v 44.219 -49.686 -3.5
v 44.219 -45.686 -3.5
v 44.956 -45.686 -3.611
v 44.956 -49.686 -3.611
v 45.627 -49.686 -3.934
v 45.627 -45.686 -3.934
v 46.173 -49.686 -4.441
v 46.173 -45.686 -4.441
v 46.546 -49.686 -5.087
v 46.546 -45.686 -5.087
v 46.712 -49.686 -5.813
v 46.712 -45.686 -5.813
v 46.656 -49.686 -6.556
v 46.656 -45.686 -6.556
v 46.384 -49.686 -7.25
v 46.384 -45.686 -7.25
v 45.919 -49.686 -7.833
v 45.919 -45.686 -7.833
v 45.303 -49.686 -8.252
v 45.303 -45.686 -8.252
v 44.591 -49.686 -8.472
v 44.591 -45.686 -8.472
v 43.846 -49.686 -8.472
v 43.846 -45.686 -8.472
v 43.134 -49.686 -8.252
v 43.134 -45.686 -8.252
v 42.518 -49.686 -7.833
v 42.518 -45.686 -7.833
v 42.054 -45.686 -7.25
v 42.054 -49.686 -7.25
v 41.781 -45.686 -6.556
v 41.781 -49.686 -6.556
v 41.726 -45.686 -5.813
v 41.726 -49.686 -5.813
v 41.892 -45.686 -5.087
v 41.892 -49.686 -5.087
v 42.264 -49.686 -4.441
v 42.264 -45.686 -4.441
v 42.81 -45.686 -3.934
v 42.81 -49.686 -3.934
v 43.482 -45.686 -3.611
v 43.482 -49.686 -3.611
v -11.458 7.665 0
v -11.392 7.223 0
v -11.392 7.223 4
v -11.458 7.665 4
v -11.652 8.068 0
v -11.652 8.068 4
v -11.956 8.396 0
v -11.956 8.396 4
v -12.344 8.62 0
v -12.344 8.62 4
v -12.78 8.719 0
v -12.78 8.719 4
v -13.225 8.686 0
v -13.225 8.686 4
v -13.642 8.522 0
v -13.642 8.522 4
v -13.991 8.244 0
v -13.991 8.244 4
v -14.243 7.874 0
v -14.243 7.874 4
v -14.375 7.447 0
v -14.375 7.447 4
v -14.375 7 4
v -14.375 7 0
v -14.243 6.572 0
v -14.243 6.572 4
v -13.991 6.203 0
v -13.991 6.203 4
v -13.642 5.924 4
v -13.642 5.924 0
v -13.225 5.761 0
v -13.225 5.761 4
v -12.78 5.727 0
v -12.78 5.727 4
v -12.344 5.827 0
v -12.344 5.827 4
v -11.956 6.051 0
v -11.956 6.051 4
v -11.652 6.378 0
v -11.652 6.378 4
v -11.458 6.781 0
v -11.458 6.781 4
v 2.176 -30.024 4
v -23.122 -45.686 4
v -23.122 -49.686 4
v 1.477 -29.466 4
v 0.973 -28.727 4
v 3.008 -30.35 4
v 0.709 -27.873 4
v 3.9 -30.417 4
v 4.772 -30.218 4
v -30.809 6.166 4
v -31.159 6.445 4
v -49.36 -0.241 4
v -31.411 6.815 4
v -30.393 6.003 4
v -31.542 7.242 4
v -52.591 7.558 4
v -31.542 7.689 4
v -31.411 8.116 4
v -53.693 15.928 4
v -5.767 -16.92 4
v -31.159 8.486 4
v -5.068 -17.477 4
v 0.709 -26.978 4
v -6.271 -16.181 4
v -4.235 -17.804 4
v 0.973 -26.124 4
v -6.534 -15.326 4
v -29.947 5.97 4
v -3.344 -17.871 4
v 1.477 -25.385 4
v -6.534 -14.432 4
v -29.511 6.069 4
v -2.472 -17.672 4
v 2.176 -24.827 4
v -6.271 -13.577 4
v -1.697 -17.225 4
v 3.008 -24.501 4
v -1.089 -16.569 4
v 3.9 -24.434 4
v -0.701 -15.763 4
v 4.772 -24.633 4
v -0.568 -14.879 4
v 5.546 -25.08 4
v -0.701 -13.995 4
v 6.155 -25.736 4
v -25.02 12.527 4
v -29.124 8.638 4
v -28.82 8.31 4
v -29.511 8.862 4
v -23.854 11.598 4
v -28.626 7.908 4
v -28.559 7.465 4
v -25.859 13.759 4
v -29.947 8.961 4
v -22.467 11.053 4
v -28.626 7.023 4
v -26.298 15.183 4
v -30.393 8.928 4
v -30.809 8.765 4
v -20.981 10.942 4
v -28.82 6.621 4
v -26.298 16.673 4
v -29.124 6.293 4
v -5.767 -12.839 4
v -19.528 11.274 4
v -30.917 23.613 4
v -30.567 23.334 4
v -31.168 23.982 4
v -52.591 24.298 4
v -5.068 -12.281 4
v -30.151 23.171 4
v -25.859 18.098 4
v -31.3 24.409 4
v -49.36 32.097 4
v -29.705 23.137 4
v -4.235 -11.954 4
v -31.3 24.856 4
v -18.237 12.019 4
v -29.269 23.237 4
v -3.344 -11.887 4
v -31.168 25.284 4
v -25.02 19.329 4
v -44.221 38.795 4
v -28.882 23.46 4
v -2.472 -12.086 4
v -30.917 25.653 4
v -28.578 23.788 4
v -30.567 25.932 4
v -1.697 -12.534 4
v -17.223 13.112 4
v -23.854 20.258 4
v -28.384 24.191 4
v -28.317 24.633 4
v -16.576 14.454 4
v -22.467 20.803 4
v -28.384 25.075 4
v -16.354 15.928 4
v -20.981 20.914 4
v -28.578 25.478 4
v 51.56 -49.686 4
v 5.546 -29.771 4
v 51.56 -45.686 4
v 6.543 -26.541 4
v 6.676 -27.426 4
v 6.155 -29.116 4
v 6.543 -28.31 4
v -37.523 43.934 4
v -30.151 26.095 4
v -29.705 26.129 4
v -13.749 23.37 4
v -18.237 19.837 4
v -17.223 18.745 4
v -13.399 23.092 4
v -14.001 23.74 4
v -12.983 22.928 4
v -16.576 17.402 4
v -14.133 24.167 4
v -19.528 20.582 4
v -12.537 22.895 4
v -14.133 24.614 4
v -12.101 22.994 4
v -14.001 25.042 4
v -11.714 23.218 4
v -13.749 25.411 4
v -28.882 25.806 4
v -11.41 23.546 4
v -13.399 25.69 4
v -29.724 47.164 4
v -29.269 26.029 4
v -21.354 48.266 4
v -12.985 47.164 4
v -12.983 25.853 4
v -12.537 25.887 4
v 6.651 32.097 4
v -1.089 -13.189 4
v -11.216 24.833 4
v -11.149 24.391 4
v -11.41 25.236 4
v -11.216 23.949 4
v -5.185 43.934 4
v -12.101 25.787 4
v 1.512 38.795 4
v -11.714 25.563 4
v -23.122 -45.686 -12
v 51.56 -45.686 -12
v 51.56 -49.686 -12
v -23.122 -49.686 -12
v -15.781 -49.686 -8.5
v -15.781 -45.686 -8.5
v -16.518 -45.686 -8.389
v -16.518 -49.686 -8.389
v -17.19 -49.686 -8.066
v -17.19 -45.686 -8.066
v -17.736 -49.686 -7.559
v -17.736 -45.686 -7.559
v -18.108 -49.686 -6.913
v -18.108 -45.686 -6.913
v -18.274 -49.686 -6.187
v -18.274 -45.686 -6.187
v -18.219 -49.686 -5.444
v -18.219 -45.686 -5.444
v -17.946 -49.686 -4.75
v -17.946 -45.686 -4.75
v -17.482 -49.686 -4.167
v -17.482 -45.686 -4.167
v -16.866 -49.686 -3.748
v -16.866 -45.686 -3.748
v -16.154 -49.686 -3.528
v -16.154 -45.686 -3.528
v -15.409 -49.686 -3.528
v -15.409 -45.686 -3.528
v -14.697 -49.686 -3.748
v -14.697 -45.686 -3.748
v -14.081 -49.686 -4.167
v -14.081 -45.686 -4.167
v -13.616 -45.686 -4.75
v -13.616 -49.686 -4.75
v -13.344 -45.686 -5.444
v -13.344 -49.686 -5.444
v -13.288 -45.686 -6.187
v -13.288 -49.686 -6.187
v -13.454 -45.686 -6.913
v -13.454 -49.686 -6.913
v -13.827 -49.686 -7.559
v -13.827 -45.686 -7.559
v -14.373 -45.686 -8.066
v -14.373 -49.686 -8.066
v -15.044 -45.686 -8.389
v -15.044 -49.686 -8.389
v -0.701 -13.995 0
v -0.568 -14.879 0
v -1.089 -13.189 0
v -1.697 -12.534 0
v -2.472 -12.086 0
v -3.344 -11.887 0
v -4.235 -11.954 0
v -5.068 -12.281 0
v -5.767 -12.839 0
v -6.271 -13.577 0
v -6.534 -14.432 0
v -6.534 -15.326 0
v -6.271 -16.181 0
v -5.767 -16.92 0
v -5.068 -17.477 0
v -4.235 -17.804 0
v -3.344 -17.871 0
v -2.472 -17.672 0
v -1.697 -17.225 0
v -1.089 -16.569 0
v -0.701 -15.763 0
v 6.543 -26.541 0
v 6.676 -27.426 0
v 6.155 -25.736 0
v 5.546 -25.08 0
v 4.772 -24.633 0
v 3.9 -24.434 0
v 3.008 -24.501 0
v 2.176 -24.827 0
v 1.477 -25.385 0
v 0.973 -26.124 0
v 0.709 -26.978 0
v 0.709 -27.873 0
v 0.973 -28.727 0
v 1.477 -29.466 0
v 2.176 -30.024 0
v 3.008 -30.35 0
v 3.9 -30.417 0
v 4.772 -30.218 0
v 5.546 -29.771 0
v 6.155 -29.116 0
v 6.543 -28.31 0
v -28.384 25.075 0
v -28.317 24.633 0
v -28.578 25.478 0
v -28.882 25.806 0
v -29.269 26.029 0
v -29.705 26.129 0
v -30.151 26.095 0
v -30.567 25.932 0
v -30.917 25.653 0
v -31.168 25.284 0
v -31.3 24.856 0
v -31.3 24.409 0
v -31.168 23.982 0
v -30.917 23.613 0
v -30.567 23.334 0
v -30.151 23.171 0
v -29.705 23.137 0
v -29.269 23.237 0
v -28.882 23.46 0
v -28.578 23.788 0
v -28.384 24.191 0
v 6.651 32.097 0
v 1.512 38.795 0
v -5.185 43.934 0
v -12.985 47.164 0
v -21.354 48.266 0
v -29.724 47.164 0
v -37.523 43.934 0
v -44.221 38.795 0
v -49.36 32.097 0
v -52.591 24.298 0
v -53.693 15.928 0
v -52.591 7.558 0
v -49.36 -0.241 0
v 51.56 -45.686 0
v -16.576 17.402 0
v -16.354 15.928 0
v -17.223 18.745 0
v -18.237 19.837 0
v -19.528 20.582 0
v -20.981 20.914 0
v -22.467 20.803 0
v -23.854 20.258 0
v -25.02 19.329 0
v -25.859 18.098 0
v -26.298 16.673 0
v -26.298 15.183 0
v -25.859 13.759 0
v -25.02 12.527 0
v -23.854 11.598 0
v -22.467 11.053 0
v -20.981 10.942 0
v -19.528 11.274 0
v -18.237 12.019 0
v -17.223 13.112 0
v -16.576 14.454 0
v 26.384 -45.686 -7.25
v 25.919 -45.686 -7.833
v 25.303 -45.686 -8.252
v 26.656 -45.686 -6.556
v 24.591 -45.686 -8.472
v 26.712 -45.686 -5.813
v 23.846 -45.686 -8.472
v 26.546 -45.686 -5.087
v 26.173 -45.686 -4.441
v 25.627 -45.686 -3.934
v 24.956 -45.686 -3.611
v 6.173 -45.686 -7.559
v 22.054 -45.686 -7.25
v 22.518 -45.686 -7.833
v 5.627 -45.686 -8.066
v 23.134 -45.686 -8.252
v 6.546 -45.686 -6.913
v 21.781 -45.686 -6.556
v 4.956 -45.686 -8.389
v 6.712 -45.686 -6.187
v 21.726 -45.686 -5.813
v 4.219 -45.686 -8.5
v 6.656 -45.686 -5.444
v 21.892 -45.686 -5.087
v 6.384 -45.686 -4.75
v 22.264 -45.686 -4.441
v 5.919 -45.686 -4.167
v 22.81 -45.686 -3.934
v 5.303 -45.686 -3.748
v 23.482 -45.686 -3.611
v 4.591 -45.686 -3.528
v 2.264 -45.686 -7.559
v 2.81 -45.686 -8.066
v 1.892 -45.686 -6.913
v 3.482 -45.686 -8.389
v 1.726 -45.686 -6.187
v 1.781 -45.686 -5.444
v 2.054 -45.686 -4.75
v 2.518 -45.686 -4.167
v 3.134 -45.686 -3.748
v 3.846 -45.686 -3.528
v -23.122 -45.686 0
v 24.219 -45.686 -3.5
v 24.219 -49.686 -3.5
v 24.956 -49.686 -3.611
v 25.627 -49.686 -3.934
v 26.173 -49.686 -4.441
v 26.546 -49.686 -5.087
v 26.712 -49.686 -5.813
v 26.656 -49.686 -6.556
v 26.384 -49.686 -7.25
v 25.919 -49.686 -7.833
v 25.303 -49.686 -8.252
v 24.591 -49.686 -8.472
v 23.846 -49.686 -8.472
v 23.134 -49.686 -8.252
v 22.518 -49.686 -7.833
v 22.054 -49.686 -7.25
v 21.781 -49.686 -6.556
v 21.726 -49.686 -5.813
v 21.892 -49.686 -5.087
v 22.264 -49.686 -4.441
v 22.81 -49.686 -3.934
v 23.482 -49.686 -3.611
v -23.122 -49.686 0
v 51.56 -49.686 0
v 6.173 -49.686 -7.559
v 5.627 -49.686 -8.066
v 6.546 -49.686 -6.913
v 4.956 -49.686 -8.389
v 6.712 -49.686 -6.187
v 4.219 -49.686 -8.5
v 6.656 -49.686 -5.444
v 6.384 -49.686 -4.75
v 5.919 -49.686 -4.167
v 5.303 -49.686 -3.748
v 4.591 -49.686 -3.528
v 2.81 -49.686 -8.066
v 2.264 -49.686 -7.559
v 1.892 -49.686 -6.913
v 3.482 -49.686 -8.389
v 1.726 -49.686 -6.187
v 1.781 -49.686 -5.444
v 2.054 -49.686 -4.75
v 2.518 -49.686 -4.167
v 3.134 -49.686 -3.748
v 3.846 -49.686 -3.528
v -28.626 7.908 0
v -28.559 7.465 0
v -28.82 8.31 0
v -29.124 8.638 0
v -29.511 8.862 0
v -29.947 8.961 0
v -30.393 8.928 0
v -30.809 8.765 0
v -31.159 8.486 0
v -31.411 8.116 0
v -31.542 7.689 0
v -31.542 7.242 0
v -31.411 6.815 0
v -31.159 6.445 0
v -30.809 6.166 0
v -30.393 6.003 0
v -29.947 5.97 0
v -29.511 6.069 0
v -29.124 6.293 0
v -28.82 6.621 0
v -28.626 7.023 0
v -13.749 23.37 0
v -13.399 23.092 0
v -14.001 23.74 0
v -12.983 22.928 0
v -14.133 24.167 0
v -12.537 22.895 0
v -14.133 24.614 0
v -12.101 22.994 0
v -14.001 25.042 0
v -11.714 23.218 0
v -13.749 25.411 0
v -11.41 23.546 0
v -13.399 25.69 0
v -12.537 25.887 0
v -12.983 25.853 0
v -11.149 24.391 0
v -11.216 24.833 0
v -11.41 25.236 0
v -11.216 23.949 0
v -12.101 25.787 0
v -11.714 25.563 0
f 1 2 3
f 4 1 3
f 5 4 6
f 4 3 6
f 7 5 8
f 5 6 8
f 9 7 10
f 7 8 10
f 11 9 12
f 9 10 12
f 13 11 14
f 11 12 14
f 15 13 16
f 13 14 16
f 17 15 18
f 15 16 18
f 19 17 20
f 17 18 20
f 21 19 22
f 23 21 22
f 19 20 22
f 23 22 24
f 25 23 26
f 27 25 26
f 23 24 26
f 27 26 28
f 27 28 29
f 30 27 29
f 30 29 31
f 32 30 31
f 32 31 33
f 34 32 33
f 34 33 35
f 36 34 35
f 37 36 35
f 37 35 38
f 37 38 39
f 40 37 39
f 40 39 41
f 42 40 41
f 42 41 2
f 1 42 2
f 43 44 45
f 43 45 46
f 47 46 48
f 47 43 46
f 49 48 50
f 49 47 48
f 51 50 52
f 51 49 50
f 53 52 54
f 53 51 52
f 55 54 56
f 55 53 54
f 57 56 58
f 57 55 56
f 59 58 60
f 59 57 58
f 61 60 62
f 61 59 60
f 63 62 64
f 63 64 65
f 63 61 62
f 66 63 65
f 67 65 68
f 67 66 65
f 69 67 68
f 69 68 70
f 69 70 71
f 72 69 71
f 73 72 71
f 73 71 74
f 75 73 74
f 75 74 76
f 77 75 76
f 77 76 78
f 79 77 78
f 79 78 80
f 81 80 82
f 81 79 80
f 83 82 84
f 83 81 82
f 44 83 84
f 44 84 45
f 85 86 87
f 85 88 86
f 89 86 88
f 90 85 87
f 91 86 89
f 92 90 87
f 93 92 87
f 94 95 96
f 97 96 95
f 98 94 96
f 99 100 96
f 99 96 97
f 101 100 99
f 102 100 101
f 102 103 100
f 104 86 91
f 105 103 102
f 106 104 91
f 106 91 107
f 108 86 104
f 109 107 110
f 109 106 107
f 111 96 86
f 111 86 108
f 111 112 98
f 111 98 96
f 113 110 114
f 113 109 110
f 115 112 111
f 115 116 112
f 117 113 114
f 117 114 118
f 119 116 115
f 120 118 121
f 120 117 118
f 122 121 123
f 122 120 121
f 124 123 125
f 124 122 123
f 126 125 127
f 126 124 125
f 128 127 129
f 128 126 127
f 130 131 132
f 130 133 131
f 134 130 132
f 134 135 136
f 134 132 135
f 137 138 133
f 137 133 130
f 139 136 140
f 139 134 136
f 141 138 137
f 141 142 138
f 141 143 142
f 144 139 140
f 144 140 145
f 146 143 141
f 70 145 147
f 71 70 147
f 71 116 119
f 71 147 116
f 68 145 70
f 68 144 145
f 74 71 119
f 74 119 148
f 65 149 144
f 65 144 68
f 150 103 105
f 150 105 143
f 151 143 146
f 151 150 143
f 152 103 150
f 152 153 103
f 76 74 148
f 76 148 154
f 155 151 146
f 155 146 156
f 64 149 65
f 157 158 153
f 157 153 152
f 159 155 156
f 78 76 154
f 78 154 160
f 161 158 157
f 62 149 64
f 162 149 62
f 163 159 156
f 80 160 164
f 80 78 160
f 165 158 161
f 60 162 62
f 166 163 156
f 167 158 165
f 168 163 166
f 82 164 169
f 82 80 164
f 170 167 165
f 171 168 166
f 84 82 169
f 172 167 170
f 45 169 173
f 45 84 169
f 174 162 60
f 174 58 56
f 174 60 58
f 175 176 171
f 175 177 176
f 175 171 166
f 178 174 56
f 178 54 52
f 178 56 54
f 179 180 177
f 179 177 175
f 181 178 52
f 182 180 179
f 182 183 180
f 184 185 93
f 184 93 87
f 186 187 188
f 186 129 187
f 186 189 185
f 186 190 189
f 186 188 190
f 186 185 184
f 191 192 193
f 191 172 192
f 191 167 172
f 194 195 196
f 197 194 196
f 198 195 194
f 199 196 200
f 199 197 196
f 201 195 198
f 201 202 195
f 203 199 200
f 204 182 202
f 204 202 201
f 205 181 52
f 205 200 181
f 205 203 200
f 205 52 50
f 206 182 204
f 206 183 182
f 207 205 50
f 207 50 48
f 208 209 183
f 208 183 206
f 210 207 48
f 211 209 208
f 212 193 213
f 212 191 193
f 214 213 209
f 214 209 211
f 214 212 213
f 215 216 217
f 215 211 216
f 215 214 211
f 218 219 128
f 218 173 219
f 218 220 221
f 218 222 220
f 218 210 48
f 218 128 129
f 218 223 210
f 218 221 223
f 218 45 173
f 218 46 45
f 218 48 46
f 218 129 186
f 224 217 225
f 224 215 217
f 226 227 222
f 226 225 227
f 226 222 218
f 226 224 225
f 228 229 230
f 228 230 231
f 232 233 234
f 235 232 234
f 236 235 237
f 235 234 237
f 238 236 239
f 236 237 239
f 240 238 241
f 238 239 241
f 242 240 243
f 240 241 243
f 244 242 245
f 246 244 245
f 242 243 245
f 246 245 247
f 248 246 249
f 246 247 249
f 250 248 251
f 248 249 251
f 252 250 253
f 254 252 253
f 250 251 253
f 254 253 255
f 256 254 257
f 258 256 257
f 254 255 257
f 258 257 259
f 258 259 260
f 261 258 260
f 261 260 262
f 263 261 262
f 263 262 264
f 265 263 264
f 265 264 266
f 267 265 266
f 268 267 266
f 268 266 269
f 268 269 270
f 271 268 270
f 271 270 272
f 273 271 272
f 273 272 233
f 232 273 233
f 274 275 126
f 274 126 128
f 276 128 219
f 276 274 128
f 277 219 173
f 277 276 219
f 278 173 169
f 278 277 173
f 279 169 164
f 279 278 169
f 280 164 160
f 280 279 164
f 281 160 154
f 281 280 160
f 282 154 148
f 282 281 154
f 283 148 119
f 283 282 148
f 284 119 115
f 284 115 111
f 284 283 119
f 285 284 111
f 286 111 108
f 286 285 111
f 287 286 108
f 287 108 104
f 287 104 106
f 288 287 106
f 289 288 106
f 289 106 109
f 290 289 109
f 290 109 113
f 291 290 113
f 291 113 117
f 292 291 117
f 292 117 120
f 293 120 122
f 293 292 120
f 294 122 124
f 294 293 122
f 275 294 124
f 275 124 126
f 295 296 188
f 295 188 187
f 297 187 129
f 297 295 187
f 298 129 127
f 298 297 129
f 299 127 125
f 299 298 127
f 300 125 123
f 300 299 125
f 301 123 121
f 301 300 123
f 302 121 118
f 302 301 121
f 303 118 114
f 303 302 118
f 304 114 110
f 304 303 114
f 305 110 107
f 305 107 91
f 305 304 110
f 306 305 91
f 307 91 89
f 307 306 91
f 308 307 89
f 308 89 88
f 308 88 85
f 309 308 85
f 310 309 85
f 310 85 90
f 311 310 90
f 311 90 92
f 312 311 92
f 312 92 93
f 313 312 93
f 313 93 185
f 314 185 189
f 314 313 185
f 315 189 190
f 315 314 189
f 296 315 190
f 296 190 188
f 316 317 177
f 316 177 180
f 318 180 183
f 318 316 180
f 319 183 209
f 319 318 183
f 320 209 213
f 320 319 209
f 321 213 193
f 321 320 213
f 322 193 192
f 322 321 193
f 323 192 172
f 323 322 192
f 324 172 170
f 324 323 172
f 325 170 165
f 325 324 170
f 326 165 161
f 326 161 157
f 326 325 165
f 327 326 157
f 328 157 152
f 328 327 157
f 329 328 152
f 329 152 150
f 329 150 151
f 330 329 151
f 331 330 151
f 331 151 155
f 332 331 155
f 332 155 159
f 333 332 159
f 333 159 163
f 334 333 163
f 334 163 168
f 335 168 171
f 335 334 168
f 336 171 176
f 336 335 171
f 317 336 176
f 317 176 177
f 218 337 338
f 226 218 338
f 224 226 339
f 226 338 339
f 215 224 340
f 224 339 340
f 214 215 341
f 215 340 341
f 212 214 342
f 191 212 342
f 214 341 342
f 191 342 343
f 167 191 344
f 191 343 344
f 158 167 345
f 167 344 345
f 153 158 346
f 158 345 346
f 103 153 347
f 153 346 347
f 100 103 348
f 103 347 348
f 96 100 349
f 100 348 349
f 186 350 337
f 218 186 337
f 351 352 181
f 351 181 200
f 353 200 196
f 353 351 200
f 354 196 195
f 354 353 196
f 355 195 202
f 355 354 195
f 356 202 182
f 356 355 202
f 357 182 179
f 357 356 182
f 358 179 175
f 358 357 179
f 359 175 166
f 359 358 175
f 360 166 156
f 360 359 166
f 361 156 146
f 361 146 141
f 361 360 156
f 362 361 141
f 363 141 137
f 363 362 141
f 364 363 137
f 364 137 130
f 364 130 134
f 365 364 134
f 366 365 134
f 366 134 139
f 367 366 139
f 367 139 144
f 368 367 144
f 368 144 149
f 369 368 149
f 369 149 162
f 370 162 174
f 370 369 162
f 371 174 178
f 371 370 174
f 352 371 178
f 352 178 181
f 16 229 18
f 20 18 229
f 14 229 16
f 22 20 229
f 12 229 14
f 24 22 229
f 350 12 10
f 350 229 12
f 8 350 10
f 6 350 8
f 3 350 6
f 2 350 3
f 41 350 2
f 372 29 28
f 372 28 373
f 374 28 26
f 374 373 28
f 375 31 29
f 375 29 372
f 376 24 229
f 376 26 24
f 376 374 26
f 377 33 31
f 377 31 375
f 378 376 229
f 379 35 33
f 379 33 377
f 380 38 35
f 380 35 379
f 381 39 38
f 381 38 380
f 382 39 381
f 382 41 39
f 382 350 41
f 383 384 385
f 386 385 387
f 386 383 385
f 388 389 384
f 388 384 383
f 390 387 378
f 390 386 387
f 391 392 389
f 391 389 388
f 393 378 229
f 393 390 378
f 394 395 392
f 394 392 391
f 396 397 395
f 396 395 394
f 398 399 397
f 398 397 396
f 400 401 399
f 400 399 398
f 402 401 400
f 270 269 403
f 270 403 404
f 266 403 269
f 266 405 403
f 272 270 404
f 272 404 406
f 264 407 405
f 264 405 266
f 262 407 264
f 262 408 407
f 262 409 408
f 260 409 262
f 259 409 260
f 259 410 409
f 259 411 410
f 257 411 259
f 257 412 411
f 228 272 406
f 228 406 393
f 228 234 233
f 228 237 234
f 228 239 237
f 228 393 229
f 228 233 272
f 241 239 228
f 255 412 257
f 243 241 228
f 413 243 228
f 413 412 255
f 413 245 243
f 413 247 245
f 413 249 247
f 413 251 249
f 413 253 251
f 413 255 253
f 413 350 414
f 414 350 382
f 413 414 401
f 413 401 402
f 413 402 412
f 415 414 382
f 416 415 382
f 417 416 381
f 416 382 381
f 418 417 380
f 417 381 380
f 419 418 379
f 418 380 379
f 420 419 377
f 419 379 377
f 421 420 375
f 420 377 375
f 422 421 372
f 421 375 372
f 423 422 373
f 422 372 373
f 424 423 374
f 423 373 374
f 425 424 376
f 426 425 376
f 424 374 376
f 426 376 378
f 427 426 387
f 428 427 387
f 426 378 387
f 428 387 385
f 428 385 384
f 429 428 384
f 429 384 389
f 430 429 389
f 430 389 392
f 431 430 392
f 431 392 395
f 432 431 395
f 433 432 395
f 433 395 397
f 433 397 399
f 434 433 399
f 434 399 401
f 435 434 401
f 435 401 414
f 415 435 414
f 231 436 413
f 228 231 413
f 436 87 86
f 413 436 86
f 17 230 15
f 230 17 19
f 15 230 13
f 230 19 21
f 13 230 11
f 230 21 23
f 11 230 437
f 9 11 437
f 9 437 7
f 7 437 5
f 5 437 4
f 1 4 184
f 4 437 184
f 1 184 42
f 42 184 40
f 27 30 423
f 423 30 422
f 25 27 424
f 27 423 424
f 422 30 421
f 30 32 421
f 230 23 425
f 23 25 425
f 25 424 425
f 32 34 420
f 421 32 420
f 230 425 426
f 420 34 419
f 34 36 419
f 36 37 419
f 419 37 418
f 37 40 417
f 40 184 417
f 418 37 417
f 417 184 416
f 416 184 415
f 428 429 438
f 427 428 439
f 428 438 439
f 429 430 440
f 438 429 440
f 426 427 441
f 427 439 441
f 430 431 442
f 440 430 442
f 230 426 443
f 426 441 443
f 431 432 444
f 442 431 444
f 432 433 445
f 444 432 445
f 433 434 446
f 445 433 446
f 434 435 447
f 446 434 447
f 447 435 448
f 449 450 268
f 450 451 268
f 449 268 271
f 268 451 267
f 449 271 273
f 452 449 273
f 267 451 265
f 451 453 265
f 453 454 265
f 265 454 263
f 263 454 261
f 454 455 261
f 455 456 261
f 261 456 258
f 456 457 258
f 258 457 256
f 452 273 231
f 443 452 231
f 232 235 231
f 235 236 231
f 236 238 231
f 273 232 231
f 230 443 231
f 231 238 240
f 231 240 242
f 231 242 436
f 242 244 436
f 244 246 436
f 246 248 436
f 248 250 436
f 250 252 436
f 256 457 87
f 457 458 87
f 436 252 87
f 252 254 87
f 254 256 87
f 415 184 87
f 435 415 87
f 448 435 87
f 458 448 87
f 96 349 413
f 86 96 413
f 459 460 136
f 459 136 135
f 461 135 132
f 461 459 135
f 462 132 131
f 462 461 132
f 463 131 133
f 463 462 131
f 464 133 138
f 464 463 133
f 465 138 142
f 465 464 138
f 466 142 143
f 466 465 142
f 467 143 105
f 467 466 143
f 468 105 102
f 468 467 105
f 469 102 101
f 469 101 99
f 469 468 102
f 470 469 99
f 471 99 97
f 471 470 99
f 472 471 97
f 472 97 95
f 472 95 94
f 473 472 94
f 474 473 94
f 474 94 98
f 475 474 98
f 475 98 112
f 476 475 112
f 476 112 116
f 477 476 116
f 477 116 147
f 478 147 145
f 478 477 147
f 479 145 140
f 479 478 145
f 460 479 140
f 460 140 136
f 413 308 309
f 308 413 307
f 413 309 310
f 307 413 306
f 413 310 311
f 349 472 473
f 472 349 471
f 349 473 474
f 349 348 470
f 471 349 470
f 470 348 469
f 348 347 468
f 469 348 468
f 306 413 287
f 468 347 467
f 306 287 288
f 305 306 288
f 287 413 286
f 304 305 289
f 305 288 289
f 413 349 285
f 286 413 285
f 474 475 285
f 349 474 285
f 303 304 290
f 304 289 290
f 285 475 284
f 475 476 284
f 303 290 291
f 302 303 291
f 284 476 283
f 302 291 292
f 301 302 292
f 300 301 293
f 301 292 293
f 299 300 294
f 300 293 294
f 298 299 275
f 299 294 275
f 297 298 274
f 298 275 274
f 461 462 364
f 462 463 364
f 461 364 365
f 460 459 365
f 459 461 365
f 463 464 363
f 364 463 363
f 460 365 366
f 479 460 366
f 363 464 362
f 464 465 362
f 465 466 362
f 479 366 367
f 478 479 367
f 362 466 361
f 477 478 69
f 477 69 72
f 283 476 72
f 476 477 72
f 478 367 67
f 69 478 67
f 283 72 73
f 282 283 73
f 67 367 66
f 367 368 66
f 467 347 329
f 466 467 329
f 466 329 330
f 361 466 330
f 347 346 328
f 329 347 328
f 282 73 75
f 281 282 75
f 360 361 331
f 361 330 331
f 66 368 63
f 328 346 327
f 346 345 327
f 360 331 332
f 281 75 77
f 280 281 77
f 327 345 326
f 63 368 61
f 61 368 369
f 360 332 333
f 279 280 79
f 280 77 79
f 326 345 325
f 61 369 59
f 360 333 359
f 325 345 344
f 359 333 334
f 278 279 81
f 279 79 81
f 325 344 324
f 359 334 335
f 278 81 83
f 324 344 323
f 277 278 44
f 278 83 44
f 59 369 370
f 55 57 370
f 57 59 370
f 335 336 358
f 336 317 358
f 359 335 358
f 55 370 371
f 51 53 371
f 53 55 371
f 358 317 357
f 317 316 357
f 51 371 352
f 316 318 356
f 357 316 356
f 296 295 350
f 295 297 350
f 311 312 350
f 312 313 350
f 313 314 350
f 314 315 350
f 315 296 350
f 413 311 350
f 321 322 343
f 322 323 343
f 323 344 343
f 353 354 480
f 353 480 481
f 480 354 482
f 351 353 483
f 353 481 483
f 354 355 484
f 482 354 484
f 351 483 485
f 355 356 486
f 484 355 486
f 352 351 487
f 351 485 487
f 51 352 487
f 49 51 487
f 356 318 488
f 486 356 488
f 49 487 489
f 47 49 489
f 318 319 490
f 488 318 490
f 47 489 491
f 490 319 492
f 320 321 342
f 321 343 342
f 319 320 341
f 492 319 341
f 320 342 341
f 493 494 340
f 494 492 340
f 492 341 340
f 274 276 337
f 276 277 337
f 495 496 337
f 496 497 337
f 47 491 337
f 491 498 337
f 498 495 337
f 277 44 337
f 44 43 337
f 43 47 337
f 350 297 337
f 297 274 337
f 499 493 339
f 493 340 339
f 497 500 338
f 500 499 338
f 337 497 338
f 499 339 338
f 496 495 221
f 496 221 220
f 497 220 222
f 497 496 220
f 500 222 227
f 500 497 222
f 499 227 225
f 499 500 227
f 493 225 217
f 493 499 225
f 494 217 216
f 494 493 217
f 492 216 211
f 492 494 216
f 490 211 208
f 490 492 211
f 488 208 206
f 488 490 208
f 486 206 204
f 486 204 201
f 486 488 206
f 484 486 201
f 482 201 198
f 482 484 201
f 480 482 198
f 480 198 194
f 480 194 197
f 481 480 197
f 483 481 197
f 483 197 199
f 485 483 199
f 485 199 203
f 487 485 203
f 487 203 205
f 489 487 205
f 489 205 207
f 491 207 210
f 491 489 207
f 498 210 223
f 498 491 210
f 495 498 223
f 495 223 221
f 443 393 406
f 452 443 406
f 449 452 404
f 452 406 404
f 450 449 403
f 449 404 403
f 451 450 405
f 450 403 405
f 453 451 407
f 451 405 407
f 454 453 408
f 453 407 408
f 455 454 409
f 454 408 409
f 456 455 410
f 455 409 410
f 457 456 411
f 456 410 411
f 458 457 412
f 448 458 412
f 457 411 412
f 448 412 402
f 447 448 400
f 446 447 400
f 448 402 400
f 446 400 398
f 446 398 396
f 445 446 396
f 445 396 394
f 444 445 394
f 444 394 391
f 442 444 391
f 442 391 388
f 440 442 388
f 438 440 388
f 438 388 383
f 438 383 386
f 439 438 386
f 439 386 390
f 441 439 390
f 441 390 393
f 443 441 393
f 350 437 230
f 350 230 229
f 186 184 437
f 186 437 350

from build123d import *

# Parameters (mm, degrees)
SKETCH_1_R          = 5
SKETCH_1_R_2        = 1.5
SKETCH_1_R_3        = 3
EXTRUDE_1_DEPTH     = 4
SKETCH_2_W          = 74.681955409
SKETCH_2_H          = 4
EXTRUDE_2_DEPTH     = 12
SKETCH_3_R          = 2.5
CUT_EXTRUDE_1_DEPTH = 109.876048253


with BuildPart() as part:
    # 草图1 → 凸台-拉伸1 (new body)
    with BuildSketch(Plane.XY):
        with BuildLine():
            Line((-49.360062144, -0.241015089), (-23.122201524, -45.686322765))
            Line((-23.122201524, -45.686322765), (-23.122201524, -49.686322765))
            Line((-23.122201524, -49.686322765), (51.559753885, -49.686322765))
            Line((51.559753885, -49.686322765), (51.559753885, -45.686322765))
            Line((51.559753885, -45.686322765), (6.651404412, 32.097220205))
            ThreePointArc((6.651404412, 32.097220205), (-37.523446513, 43.933835837), (-49.360062144, -0.241015089))
        make_face()
        with Locations((-21.354328866, 15.928102558)):
            Circle(SKETCH_1_R, mode=Mode.SUBTRACT)
        with Locations((-29.816939203, 24.632935589)):
            Circle(SKETCH_1_R_2, mode=Mode.SUBTRACT)
        with Locations((-12.649495836, 24.390712895)):
            Circle(SKETCH_1_R_2, mode=Mode.SUBTRACT)
        with Locations((-12.89171853, 7.223269528)):
            Circle(SKETCH_1_R_2, mode=Mode.SUBTRACT)
        with Locations((-30.059161896, 7.465492222)):
            Circle(SKETCH_1_R_2, mode=Mode.SUBTRACT)
        with Locations((-3.567776343, -14.879110103)):
            Circle(SKETCH_1_R_3, mode=Mode.SUBTRACT)
        with Locations((3.675910259, -27.425543331)):
            Circle(SKETCH_1_R_3, mode=Mode.SUBTRACT)
    extrude(amount=EXTRUDE_1_DEPTH)

    # 草图2 → 凸台-拉伸2 (add)
    with BuildSketch(Plane(origin=(0, 0, 0), x_dir=(-1, 0, 0), z_dir=(0, 0, -1))):
        with Locations((-14.218776181, -47.686322765)):
            Rectangle(SKETCH_2_W, SKETCH_2_H)
    extrude(amount=EXTRUDE_2_DEPTH)

    # 草图3 → 切除-拉伸1 (cut, through all)
    with BuildSketch(Plane(origin=(0, -45.686322765, 0), x_dir=(1, 0, 0), z_dir=(0, 1, 0))):
        with Locations(Location((24.21877618, 6, 0), (0, 0, 270))):
            Circle(SKETCH_3_R)
        with Locations(Location((44.21877618, 6, 0), (0, 0, 270))):
            Circle(SKETCH_3_R)
        with Locations(Location((-15.78122382, 6, 0), (0, 0, 90))):
            Circle(SKETCH_3_R)
        with Locations(Location((4.21877618, 6, 0), (0, 0, 90))):
            Circle(SKETCH_3_R)
    extrude(amount=-CUT_EXTRUDE_1_DEPTH, mode=Mode.SUBTRACT)


solid = part.part
